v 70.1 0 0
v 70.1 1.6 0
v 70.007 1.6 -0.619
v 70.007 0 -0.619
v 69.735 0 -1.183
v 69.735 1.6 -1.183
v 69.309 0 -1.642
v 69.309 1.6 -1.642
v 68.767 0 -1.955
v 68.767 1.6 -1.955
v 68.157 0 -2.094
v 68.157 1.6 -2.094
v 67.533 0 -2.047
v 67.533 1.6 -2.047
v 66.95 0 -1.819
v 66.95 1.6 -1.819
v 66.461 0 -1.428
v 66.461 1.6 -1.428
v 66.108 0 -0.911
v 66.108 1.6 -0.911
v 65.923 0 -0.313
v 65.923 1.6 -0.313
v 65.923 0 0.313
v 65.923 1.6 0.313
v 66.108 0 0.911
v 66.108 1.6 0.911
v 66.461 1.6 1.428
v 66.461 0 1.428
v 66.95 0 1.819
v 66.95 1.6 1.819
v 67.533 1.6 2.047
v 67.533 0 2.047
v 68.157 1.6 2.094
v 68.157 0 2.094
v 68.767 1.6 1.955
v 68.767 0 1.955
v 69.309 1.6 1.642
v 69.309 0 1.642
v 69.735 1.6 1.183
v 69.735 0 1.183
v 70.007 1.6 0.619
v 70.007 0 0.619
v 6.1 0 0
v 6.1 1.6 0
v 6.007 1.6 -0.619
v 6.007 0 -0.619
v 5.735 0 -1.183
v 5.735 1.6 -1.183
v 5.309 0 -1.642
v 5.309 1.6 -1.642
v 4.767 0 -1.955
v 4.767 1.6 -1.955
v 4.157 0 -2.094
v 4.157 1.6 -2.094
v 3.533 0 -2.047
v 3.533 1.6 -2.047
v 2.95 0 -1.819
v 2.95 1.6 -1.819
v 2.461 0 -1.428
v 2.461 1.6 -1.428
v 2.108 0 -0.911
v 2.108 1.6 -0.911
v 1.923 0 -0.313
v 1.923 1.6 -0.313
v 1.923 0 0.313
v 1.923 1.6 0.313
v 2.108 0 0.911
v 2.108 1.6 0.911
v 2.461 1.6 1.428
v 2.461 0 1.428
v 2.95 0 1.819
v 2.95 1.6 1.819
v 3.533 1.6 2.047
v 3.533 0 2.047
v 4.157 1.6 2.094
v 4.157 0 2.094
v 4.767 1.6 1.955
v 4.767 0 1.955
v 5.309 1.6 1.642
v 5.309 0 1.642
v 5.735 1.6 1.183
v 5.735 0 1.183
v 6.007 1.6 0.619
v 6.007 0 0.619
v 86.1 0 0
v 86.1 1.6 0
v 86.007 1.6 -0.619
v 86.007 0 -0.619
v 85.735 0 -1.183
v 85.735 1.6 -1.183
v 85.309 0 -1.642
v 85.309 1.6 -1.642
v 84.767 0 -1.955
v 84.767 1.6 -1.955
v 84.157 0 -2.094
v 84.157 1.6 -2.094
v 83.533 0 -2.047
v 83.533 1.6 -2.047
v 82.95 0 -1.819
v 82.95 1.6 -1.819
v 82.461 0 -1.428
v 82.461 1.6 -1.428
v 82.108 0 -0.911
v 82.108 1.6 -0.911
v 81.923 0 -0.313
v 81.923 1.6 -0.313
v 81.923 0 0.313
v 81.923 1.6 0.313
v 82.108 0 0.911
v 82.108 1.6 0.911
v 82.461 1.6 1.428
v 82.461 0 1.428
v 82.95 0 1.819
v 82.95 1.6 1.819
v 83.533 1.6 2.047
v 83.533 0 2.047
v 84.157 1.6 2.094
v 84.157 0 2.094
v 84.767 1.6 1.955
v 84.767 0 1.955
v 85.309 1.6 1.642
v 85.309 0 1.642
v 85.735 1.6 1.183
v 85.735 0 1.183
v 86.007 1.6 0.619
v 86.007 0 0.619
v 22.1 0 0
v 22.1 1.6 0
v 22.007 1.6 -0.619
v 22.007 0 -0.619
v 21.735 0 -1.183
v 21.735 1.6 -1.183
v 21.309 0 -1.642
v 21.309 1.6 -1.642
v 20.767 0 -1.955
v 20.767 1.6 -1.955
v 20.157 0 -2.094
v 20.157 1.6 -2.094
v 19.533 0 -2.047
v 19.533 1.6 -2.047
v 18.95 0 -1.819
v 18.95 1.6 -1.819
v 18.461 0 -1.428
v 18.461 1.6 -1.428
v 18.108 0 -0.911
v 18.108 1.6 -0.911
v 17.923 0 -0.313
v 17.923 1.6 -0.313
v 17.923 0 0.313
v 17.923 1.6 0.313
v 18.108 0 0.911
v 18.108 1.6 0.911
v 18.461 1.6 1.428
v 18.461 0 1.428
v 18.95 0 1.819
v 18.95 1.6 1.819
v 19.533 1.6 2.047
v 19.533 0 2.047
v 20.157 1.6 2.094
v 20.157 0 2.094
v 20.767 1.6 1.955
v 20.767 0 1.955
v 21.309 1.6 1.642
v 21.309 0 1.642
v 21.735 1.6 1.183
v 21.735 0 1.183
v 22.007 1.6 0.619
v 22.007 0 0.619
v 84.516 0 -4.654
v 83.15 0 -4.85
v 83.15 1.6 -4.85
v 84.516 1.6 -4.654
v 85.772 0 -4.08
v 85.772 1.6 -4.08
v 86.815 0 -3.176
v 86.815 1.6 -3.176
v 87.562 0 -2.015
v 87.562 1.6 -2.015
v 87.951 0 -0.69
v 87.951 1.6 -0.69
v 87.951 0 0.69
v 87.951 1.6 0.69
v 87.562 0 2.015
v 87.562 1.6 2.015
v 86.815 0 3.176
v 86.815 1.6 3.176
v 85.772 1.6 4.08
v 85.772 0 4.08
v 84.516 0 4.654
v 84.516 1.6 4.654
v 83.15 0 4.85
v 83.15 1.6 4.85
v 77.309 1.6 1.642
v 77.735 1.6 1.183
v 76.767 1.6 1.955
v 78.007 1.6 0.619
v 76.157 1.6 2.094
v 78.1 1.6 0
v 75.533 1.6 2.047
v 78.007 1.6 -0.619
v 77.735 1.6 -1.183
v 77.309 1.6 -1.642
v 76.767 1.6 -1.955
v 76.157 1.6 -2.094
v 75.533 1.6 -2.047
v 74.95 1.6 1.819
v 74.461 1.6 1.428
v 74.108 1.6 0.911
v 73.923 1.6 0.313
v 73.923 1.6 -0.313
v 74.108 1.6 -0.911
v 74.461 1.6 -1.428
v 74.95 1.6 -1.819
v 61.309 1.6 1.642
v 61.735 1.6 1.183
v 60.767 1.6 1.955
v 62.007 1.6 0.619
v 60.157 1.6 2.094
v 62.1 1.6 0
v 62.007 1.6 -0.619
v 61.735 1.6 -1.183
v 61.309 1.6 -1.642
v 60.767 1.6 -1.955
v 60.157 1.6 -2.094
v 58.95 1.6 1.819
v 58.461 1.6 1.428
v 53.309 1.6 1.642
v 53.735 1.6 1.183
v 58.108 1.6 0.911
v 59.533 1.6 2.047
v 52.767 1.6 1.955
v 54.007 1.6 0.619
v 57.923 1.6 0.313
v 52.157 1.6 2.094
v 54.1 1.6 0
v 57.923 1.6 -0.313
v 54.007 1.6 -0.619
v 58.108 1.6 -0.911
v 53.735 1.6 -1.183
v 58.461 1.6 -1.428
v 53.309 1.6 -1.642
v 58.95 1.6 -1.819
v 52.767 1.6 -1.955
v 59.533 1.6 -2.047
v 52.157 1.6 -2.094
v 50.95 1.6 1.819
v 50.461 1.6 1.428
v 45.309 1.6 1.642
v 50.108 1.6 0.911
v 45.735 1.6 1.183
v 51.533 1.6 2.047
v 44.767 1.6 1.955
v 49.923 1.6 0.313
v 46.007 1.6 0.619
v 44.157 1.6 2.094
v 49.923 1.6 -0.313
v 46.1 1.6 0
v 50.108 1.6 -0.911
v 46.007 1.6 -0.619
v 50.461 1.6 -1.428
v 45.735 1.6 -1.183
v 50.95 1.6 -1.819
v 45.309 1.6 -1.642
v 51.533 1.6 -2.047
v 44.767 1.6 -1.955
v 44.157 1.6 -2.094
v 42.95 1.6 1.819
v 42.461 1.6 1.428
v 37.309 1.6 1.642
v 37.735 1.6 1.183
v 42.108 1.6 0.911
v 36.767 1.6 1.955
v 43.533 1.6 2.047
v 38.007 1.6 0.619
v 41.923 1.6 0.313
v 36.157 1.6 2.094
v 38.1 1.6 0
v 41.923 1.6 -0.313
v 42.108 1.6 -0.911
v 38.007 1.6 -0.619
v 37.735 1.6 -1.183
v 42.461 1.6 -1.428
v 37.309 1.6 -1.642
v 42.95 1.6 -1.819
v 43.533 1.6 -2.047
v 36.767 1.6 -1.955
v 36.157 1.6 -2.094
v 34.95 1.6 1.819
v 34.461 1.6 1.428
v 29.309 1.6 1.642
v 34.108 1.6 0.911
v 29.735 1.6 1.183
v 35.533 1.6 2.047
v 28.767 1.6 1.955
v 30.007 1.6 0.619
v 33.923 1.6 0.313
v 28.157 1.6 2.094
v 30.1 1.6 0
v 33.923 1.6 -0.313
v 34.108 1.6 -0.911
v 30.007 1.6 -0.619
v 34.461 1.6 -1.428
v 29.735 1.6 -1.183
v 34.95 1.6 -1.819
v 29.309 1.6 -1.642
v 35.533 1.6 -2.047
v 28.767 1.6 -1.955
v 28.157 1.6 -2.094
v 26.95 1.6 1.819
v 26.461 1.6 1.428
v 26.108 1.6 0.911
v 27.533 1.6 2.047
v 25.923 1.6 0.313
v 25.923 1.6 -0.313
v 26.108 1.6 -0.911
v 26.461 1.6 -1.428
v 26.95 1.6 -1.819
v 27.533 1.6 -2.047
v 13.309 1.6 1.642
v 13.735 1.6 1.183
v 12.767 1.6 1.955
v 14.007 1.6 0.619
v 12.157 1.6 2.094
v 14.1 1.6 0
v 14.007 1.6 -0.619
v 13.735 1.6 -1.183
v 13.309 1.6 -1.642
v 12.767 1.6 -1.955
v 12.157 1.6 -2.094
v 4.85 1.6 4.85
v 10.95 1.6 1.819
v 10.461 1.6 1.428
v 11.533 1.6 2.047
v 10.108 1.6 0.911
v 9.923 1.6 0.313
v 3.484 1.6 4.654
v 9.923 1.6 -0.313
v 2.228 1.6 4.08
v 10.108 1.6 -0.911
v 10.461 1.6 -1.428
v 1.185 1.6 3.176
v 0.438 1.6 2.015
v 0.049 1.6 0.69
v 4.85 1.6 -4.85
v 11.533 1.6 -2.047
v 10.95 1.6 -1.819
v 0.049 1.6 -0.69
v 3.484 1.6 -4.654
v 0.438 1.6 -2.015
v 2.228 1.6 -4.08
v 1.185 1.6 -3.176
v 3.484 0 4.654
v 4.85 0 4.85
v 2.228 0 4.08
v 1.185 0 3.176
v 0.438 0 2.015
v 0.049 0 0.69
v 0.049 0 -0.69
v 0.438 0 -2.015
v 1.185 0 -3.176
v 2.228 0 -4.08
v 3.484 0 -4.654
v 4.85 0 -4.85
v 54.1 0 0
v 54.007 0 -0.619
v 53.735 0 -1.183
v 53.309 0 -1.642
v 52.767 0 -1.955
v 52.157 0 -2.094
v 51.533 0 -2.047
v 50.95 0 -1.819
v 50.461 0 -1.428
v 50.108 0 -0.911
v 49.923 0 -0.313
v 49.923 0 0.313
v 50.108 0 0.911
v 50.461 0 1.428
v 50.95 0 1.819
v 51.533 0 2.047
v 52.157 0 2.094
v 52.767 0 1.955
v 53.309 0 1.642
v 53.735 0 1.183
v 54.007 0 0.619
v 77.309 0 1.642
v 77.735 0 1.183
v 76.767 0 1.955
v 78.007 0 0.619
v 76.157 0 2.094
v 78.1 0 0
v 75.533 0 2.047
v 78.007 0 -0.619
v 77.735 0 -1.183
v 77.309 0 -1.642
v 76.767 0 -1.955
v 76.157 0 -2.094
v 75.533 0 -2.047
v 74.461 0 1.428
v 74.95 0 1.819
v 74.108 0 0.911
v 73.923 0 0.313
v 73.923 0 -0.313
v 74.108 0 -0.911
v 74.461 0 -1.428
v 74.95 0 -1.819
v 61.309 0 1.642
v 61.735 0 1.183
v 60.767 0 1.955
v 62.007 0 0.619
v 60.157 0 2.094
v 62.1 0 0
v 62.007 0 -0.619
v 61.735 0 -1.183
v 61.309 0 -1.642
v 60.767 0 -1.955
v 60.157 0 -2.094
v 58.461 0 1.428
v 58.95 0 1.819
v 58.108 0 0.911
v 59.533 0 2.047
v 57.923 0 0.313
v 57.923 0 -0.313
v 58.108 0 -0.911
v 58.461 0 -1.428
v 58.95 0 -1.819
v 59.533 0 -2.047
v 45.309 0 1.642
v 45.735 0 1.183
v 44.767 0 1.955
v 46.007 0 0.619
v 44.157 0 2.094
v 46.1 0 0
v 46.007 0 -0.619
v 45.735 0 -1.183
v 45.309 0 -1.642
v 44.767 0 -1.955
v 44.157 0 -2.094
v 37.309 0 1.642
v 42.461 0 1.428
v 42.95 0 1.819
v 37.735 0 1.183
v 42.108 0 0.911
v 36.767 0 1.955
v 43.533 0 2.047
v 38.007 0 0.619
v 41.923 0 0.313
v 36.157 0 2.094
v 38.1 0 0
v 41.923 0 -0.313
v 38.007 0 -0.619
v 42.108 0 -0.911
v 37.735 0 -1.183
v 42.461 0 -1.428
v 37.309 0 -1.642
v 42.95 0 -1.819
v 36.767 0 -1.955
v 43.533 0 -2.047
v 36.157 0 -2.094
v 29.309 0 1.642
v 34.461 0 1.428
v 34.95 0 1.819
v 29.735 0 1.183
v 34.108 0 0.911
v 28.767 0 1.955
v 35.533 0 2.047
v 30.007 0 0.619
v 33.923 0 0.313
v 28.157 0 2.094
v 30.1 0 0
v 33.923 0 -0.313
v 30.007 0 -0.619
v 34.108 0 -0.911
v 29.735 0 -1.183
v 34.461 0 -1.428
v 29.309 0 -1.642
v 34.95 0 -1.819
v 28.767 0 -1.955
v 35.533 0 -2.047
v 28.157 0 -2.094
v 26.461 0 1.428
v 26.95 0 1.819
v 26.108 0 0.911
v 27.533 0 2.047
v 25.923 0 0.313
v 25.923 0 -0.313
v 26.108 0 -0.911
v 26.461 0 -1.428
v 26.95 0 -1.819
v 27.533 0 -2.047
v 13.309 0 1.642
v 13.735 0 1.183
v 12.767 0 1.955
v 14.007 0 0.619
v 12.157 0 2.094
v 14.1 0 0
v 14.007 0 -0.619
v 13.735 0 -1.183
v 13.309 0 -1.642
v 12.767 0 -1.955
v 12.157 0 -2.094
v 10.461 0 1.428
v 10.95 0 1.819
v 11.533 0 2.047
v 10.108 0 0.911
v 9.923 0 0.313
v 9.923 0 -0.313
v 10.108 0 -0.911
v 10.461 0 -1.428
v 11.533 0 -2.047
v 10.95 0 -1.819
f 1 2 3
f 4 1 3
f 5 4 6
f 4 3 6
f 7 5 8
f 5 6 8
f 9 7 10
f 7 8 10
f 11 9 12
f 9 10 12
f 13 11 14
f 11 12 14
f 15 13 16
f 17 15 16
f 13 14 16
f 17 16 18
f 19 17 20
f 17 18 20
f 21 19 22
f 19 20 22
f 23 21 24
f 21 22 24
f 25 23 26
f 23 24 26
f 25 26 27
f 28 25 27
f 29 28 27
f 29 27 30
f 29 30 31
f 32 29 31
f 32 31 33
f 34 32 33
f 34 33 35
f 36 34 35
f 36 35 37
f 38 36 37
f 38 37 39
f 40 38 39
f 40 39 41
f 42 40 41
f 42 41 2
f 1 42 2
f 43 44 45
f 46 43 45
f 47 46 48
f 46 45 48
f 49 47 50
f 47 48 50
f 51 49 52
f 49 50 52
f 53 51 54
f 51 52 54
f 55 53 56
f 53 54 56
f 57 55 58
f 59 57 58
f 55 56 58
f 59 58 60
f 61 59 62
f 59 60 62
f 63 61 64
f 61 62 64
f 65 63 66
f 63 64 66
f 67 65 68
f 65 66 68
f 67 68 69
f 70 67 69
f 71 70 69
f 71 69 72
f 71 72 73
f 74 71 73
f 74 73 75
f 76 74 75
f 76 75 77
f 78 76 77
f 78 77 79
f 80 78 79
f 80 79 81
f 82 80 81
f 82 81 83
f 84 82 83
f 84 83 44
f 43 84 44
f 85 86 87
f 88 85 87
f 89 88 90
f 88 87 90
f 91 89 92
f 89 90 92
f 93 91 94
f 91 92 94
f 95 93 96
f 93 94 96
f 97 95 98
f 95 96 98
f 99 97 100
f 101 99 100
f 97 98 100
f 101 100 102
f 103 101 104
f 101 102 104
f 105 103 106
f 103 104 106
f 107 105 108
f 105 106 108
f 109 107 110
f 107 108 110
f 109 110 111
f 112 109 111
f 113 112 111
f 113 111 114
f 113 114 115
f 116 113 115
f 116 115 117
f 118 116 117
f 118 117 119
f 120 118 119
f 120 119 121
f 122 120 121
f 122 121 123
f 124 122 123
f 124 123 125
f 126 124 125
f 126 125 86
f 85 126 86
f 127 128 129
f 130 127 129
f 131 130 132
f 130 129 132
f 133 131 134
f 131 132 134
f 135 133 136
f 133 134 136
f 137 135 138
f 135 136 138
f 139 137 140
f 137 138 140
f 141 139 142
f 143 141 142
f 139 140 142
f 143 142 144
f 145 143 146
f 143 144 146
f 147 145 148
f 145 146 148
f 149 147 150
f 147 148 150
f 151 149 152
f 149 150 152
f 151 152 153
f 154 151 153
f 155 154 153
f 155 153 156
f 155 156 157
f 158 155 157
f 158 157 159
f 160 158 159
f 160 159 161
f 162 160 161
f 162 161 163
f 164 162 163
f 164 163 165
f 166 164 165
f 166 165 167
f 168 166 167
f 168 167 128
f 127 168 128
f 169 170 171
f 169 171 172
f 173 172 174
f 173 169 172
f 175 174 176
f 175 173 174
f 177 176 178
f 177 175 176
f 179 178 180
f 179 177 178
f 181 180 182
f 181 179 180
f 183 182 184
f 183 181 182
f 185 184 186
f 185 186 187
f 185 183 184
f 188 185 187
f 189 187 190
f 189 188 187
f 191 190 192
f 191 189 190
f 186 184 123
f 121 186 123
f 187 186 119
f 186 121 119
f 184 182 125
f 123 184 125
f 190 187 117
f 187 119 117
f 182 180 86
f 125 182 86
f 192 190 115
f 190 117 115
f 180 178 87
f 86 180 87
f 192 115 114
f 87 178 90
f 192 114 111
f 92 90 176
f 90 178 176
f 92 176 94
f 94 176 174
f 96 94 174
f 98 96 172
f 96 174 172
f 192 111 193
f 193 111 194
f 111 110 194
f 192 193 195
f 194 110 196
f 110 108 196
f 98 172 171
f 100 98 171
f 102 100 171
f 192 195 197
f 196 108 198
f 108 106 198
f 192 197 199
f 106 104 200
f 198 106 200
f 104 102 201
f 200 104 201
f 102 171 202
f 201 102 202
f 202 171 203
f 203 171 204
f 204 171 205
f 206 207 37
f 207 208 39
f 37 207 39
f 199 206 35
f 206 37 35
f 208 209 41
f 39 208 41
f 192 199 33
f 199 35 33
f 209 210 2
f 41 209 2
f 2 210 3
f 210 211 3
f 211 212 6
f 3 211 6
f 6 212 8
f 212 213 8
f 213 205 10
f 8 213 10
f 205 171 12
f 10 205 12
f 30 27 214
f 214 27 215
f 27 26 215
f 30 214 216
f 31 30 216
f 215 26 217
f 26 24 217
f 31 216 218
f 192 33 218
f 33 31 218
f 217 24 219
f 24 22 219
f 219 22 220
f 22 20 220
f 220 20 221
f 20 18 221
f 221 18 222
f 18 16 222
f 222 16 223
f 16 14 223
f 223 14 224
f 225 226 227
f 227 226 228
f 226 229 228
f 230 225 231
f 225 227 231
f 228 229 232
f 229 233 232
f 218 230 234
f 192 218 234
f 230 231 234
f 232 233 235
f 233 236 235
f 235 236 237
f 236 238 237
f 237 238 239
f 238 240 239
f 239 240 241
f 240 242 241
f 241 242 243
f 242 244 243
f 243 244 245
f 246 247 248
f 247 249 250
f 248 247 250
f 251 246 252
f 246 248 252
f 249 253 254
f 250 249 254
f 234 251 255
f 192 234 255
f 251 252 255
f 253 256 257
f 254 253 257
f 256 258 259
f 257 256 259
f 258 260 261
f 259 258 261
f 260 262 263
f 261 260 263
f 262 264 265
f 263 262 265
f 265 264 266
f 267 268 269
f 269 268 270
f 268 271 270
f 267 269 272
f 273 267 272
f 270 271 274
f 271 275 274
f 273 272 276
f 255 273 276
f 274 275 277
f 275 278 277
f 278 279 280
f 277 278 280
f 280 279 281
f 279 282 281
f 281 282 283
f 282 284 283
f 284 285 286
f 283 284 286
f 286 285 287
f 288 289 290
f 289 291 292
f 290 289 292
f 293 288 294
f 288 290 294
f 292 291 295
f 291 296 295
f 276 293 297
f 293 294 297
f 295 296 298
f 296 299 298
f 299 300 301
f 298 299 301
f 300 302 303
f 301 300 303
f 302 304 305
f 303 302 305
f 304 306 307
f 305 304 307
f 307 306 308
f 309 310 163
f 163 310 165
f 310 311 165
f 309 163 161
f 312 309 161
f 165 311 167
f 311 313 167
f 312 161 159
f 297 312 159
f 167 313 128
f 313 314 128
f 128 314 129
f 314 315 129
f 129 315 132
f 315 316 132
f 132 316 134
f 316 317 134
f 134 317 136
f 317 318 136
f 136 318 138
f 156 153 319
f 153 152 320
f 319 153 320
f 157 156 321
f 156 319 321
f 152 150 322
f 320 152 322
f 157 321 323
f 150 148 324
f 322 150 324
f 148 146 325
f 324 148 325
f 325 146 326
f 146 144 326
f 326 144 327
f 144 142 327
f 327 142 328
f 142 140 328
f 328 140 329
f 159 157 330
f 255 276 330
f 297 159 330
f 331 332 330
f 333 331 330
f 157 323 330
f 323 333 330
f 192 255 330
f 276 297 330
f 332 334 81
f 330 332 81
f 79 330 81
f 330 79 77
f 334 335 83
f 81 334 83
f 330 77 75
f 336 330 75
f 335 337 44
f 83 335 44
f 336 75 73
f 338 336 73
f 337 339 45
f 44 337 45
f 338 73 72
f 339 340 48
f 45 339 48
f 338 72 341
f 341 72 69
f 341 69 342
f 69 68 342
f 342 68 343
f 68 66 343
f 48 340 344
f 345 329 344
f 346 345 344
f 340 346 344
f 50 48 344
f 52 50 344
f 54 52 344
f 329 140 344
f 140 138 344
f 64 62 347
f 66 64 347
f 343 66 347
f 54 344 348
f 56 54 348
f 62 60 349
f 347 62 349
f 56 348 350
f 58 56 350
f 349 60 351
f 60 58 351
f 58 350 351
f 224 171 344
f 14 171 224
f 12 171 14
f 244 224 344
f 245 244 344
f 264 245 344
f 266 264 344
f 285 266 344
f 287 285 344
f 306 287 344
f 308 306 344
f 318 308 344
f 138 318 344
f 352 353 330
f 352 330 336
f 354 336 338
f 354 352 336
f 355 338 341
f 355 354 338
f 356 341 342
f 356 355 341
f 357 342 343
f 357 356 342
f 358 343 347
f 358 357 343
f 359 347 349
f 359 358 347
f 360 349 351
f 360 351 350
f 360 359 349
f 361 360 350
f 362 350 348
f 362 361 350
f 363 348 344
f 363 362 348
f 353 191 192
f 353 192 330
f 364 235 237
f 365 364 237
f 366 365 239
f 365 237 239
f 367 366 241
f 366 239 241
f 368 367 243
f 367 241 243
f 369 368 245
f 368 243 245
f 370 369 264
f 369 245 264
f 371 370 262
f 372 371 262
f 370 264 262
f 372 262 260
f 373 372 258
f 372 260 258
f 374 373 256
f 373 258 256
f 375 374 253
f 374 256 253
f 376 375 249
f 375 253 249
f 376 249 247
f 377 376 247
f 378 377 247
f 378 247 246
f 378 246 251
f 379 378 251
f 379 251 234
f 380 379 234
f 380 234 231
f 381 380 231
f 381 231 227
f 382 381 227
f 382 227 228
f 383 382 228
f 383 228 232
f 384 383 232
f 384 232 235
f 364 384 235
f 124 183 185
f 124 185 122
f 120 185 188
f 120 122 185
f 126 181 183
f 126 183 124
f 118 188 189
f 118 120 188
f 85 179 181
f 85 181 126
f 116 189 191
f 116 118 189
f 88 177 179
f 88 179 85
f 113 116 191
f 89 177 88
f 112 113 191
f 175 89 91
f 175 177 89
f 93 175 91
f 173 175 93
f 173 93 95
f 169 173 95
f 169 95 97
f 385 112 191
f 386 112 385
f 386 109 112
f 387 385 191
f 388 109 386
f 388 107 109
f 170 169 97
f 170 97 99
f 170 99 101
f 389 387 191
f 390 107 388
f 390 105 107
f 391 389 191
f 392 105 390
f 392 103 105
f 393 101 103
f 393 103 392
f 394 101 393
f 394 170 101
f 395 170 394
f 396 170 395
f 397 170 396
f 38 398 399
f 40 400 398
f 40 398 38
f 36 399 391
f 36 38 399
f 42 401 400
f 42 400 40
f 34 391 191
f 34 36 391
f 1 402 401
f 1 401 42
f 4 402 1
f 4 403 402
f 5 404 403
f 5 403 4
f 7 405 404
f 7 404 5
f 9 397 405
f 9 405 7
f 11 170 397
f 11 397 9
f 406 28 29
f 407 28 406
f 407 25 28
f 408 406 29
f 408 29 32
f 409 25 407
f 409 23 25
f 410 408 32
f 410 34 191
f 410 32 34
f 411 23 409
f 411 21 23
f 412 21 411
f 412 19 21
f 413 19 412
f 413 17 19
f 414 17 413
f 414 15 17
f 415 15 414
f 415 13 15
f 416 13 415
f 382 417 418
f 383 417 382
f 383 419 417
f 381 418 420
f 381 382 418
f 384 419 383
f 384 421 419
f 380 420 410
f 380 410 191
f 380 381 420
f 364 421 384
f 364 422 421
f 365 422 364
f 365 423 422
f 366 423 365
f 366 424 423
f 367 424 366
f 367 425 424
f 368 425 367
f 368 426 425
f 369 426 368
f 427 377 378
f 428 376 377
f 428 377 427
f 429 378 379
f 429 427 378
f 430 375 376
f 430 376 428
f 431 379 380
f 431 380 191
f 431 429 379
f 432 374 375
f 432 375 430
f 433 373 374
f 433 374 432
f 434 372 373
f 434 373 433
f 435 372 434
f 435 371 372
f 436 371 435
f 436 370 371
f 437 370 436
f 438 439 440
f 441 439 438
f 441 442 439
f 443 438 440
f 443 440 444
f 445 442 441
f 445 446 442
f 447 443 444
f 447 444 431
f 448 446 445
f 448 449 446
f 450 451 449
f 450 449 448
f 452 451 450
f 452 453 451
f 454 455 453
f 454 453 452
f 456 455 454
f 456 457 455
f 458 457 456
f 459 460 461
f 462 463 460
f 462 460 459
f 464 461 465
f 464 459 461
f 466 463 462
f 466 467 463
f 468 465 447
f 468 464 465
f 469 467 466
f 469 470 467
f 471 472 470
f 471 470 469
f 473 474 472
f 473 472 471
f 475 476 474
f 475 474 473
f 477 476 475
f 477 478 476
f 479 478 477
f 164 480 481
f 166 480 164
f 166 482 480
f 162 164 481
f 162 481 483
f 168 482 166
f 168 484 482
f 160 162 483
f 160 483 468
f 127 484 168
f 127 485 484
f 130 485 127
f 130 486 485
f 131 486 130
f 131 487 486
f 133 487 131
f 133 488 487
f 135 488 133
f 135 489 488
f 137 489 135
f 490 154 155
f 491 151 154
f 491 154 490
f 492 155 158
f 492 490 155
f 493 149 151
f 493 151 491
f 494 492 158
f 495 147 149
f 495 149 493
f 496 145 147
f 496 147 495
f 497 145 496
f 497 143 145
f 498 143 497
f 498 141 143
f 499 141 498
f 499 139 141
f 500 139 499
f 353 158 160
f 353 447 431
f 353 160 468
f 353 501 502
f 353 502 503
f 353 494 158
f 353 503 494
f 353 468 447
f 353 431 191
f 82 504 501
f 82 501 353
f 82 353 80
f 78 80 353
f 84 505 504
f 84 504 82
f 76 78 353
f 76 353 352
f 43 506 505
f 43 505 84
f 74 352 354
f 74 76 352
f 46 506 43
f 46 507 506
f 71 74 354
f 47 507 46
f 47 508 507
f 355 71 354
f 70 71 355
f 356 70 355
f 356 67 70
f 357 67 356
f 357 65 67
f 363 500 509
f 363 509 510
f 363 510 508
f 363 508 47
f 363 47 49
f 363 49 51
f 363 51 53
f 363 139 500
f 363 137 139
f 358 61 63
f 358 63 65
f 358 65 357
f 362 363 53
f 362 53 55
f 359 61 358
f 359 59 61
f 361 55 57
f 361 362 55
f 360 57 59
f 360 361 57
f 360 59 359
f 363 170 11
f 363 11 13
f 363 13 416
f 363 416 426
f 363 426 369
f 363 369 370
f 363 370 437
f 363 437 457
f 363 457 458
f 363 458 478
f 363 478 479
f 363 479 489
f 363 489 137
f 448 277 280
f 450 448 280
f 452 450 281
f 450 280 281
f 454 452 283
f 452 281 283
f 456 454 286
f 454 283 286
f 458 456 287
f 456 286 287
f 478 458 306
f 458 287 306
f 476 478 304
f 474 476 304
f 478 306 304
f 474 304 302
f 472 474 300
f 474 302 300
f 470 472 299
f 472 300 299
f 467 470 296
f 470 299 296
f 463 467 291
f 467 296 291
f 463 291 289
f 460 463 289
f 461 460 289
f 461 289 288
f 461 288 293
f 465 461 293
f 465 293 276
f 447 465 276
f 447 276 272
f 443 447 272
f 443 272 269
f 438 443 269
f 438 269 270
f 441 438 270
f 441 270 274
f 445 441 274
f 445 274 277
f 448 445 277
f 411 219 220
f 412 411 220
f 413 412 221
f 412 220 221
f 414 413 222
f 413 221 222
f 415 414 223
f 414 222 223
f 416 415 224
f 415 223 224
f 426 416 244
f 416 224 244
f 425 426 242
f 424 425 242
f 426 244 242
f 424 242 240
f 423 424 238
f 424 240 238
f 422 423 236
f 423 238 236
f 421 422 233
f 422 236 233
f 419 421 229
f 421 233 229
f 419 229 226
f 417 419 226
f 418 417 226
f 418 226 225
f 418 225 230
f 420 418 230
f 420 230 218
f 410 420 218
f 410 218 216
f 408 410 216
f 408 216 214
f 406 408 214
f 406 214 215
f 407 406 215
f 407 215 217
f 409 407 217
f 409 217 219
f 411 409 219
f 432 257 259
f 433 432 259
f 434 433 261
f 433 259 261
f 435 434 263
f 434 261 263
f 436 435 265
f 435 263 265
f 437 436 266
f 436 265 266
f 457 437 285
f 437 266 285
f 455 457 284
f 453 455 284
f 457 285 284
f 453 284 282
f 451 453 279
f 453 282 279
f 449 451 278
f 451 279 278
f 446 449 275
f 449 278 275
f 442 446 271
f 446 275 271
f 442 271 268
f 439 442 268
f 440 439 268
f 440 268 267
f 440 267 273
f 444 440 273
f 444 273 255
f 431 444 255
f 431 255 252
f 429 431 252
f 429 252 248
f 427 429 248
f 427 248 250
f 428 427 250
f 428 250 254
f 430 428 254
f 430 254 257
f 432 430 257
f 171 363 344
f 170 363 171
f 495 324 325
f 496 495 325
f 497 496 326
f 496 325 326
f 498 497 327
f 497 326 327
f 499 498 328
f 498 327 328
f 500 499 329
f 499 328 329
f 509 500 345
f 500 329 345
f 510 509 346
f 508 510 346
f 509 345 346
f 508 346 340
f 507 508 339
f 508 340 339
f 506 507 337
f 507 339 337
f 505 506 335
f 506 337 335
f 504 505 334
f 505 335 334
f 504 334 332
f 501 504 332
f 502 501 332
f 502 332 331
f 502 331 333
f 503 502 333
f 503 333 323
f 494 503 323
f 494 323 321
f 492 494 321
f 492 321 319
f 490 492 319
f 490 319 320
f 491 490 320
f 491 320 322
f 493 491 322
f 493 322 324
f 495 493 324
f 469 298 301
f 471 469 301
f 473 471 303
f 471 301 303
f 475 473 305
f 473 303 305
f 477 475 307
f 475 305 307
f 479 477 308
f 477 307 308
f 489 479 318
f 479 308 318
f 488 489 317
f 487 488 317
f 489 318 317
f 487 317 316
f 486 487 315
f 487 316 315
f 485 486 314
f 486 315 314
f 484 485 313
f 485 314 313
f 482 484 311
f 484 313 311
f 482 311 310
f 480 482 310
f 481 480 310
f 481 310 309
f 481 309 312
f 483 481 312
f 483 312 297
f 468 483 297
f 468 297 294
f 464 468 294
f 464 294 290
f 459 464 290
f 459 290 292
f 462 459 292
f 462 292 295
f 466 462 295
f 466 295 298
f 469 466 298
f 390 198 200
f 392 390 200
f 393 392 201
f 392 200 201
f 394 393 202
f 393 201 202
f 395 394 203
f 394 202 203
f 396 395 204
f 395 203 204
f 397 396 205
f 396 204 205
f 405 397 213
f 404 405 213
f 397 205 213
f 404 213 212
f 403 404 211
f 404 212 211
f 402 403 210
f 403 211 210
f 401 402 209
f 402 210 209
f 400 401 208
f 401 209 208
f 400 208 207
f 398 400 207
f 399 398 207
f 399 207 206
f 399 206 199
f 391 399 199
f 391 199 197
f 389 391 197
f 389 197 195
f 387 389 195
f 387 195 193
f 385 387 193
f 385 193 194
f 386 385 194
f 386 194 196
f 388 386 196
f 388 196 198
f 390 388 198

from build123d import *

# Parameters (mm, degrees)
BOSS_EXTRUDE1_DEPTH = 1.6
SKETCH2_R           = 2.1
CUT_EXTRUDE1_DEPTH  = 2.6
LPATTERN1_COUNT     = 11
LPATTERN1_PITCH     = 8


with BuildPart() as part:
    # Sketch1 → Boss-Extrude1 (new body)
    with BuildSketch(Plane(origin=(0, 0, 0), x_dir=(1, 0, 0), z_dir=(0, 1, 0))):
        with BuildLine():
            Line((4.85, 4.85), (83.15, 4.85))
            ThreePointArc((83.15, 4.85), (88, 0), (83.15, -4.85))
            Line((83.15, -4.85), (4.85, -4.85))
            ThreePointArc((4.85, -4.85), (0, 0), (4.85, 4.85))
        make_face()
    extrude(amount=BOSS_EXTRUDE1_DEPTH)

    # Sketch2 → Cut-Extrude1 (cut, through all)
    with BuildSketch(Plane(origin=(0, 1.6, 0), x_dir=(1, 0, 0), z_dir=(0, 1, 0))):
        with Locations((4, 0)):
            Circle(SKETCH2_R)
    cut_extrude1 = extrude(amount=-CUT_EXTRUDE1_DEPTH, mode=Mode.SUBTRACT)

    # LPattern1: Cut-Extrude1 ×11
    with Locations(*[(i * LPATTERN1_PITCH, 0, 0) for i in range(1, LPATTERN1_COUNT)]):
        add(cut_extrude1, mode=Mode.SUBTRACT)


solid = part.part
